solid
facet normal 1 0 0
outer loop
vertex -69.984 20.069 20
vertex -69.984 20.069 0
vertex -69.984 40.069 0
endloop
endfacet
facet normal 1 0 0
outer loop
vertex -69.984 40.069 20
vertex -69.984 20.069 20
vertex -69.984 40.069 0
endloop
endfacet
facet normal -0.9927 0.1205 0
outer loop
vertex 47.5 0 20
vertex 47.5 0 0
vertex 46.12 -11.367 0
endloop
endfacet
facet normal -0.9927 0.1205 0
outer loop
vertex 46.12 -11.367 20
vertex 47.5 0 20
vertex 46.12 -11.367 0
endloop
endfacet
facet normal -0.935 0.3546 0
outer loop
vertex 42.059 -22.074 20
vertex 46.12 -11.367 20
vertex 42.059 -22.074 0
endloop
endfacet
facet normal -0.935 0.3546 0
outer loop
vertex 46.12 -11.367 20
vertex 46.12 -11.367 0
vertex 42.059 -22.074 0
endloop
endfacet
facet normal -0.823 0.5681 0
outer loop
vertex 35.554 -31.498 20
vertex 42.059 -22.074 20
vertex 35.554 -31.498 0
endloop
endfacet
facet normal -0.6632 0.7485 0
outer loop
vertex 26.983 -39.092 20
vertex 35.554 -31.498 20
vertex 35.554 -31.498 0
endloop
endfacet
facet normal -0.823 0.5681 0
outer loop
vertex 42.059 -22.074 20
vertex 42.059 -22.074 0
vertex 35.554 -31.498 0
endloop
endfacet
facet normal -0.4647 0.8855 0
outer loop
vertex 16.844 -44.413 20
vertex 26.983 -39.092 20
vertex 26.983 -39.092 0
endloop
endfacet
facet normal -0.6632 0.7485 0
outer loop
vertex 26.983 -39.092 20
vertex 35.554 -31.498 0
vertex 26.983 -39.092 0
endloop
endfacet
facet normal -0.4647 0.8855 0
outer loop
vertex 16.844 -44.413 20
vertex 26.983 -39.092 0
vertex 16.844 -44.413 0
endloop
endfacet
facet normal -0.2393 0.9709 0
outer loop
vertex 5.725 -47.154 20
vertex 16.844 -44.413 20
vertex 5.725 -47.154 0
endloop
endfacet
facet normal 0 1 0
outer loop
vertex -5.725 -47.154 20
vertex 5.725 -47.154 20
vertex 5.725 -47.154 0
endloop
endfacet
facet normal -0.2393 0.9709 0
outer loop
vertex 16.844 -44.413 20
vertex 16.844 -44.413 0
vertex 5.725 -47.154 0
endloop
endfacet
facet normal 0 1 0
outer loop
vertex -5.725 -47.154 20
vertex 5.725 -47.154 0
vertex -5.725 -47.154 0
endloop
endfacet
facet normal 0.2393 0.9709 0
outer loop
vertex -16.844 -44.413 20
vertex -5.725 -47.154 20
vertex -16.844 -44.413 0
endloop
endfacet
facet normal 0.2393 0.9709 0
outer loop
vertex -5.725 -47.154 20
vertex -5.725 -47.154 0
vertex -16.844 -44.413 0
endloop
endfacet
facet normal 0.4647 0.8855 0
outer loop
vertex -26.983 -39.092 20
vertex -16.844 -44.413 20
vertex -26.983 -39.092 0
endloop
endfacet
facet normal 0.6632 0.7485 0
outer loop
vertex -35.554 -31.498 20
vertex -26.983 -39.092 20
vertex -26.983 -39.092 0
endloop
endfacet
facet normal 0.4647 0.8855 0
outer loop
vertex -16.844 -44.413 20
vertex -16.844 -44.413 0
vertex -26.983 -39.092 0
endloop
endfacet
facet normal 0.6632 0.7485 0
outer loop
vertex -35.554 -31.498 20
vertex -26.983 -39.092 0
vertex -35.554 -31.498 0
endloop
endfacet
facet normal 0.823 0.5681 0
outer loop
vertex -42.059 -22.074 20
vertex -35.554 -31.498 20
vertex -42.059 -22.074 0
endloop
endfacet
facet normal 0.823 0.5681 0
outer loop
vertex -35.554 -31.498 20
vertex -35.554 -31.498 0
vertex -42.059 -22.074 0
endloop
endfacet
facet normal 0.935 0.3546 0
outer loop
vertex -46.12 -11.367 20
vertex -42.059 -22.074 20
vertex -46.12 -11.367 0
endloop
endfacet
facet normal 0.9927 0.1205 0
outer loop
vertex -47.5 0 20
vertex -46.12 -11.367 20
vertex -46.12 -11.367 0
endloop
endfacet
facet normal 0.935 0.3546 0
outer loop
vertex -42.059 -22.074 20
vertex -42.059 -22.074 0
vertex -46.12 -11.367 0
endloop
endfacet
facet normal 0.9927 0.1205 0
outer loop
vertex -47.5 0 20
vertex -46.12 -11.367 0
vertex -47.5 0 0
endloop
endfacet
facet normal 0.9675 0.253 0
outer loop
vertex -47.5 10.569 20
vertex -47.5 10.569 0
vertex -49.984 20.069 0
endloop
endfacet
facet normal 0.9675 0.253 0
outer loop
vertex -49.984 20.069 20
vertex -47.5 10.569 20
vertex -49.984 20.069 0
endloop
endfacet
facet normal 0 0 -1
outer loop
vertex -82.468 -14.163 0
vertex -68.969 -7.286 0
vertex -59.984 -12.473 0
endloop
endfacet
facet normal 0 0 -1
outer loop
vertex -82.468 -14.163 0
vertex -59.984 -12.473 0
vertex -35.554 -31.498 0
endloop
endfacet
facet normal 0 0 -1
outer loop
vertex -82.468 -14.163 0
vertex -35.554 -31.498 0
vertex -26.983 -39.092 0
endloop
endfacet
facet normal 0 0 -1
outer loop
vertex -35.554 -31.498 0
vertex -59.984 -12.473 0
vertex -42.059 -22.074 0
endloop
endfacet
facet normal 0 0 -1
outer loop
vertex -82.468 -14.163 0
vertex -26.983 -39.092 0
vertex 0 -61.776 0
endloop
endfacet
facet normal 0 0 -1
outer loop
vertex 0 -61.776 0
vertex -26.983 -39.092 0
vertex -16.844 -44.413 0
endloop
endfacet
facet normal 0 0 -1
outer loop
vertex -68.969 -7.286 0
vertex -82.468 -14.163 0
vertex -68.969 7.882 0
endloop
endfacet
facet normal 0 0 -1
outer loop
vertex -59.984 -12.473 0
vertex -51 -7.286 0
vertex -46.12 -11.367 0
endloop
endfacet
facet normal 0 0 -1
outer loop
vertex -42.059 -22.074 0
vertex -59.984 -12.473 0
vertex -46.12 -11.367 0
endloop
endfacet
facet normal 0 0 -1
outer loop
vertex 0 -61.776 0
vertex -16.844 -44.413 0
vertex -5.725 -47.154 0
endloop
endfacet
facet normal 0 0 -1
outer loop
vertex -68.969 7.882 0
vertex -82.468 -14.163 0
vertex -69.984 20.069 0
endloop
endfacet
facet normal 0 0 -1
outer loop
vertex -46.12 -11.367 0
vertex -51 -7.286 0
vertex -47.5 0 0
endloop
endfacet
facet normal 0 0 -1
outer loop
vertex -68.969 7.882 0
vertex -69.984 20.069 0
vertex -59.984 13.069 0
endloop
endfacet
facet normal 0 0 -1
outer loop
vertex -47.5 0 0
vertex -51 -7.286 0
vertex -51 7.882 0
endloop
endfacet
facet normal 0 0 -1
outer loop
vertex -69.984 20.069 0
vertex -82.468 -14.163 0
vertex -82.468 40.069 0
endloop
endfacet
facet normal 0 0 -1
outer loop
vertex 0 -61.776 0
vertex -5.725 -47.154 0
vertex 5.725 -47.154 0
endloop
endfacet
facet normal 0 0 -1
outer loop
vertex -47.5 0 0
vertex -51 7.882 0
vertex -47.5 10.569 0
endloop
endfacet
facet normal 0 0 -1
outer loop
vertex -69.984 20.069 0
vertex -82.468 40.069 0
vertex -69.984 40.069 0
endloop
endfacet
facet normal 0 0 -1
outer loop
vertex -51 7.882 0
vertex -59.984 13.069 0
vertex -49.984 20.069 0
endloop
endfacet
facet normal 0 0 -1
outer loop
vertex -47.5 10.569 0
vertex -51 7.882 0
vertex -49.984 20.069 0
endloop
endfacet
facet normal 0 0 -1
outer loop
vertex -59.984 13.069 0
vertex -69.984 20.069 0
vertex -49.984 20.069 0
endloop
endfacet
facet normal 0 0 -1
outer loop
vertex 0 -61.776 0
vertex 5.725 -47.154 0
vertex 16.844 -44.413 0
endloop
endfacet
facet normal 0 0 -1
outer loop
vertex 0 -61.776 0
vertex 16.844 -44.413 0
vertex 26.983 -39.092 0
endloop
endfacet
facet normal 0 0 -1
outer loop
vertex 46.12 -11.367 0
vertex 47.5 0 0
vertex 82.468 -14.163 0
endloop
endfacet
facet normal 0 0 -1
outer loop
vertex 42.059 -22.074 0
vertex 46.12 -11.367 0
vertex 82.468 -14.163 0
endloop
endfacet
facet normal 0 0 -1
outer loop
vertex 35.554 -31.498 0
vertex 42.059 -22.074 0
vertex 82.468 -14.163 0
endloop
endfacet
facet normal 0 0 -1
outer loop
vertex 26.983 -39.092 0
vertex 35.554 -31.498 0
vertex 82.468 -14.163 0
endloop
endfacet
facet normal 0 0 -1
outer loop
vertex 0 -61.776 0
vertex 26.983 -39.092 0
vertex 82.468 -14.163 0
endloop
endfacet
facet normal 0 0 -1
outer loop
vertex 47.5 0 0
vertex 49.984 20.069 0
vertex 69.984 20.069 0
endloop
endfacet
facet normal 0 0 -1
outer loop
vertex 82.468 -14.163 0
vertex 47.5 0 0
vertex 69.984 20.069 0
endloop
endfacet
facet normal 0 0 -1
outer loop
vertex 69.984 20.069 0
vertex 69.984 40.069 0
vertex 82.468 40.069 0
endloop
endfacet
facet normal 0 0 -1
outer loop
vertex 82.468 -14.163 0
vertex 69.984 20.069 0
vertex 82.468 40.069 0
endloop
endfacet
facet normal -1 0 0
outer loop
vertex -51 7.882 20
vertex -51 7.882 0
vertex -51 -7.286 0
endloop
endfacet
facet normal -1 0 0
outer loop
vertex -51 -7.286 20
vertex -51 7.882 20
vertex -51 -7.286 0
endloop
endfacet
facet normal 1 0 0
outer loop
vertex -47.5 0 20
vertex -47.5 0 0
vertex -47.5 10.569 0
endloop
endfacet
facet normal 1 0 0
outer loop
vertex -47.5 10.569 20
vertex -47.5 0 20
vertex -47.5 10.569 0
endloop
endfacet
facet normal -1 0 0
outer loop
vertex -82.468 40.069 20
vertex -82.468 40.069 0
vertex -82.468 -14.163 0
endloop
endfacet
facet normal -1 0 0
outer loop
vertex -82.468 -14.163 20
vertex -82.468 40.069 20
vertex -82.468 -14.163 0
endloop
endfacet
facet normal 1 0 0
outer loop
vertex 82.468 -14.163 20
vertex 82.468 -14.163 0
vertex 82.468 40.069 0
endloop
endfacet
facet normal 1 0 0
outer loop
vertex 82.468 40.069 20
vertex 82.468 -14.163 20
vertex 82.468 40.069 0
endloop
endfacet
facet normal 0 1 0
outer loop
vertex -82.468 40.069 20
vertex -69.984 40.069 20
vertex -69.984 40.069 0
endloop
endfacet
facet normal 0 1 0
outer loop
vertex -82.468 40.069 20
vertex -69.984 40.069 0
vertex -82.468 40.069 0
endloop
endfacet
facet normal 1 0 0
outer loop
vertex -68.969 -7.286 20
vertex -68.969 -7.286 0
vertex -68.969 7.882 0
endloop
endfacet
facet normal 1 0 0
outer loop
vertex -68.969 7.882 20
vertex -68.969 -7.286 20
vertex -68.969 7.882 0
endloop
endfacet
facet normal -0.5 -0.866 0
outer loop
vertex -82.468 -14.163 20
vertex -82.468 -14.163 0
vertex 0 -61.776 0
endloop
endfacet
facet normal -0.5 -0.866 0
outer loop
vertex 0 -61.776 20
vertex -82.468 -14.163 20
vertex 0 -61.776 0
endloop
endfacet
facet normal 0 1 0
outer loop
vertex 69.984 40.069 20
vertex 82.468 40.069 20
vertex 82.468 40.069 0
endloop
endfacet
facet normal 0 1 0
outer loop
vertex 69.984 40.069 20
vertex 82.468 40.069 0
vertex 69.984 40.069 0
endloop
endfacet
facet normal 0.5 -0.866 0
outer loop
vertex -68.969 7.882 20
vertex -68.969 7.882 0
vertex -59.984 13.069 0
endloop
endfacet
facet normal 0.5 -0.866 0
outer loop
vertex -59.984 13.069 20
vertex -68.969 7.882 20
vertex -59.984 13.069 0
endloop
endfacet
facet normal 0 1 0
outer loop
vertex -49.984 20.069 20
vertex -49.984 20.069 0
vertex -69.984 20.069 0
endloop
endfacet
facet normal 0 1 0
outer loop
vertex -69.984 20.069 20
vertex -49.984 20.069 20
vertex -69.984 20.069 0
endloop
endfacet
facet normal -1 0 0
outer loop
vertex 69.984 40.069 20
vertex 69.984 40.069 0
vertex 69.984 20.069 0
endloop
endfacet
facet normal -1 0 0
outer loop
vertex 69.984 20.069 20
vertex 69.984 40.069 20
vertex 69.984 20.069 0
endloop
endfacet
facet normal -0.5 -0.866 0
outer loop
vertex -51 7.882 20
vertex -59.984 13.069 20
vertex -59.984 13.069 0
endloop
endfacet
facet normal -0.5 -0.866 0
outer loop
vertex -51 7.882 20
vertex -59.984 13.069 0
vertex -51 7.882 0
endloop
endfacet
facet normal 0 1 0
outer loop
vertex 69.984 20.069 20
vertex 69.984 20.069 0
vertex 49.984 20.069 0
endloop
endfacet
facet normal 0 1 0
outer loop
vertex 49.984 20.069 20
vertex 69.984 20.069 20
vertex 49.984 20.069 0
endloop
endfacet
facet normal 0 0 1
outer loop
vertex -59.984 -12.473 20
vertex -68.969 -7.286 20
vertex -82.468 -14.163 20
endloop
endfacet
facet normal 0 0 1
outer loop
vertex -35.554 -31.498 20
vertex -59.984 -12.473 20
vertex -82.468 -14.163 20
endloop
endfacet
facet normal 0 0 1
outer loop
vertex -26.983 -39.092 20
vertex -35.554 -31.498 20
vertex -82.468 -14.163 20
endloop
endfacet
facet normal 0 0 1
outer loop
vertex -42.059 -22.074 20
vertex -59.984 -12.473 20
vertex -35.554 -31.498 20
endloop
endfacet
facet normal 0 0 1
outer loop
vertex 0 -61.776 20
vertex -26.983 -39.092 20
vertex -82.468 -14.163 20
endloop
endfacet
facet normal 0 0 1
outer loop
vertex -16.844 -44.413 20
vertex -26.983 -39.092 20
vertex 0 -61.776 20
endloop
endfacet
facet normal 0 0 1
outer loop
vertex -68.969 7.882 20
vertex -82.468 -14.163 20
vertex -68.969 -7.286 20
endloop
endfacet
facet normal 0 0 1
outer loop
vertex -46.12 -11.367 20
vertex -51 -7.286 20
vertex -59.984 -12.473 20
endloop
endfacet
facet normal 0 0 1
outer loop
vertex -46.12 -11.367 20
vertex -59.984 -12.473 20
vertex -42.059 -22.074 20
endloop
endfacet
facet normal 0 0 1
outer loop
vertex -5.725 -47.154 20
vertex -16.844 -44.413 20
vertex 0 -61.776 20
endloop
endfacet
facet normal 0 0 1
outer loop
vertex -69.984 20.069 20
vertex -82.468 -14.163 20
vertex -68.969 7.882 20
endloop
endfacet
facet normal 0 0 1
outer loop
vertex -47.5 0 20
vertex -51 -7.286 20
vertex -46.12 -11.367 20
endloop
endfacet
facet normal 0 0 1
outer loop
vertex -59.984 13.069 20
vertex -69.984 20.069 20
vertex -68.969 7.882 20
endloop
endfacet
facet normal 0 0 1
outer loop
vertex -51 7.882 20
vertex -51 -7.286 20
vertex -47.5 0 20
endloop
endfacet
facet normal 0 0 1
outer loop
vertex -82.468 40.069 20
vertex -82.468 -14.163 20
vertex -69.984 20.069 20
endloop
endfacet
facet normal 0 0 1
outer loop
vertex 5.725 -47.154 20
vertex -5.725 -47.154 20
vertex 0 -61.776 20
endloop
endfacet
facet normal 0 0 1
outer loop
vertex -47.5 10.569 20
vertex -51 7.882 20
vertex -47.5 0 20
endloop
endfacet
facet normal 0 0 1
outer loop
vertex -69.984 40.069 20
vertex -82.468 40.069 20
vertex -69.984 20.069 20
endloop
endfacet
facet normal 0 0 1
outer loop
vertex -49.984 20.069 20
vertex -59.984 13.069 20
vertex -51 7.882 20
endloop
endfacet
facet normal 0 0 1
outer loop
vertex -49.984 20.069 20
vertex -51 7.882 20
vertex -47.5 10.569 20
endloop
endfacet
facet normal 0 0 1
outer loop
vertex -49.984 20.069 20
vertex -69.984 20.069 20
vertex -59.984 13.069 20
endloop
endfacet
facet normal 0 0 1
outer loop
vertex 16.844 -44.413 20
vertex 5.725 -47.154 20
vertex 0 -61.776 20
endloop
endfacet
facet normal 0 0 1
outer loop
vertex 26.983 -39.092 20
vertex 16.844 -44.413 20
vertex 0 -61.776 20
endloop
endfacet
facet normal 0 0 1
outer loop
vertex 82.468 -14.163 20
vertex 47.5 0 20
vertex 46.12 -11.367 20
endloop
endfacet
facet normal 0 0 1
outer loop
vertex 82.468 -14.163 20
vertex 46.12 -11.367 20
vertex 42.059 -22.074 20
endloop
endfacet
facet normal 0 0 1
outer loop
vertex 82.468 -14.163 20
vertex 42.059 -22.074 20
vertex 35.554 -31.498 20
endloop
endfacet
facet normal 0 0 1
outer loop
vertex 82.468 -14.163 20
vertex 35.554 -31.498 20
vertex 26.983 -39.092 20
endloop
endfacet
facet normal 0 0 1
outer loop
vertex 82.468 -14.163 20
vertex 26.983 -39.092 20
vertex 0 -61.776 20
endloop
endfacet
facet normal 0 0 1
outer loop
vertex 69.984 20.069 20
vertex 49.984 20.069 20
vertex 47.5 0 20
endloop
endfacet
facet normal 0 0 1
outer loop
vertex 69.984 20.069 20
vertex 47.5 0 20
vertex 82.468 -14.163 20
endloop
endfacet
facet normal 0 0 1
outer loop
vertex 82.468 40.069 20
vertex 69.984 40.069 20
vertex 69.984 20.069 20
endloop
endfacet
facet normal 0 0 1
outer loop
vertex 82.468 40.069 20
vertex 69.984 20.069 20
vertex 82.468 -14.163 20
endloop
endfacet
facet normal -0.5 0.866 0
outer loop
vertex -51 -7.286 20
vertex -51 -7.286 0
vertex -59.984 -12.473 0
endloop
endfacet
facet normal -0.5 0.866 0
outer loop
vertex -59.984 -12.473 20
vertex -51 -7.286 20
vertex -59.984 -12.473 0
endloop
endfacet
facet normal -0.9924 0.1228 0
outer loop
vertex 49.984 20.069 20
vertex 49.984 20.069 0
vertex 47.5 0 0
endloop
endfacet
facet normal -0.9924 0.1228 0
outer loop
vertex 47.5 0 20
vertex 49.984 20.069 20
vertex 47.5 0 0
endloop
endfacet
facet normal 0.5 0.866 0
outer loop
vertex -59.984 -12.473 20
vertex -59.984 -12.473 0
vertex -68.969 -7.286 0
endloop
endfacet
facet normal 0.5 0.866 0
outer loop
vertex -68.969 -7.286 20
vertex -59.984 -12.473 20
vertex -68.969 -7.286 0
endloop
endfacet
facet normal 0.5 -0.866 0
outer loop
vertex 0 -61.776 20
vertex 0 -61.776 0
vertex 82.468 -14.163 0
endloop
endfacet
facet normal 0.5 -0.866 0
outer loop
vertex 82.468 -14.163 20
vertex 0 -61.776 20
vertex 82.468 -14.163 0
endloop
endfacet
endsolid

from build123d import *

# Parameters (mm, degrees)
AUFSATZ_LINEAR_AUSTRAGEN1_DEPTH = 20


with BuildPart() as part:
    # Skizze1 → Aufsatz-Linear austragen1 (new body)
    with BuildSketch(Plane.XY):
        with BuildLine():
            Line((-49.984452808, 20.068980322), (-69.984452808, 20.068980322))
            Line((-69.984452808, 20.068980322), (-69.984452808, 40.068980322))
            Line((-69.984452808, 40.068980322), (-82.468350795, 40.068980322))
            Line((-82.468350795, 40.068980322), (-82.468350795, -2.937308237))
            Line((-82.468350795, -2.937308237), (-82.468350795, -14.163354272))
            Line((-82.468350795, -14.163354272), (0, -61.776478803))
            Line((0, -61.776478803), (82.468350795, -14.163354272))
            Line((82.468350795, -14.163354272), (82.468350795, -2.937308237))
            Line((82.468350795, -2.937308237), (82.468350795, 40.068980322))
            Line((82.468350795, 40.068980322), (69.984452808, 40.068980322))
            Line((69.984452808, 40.068980322), (69.984452808, 20.068980322))
            Line((69.984452808, 20.068980322), (49.984452808, 20.068980322))
            Line((49.984452808, 20.068980322), (47.5, 0))
            ThreePointArc((47.5, 0), (0, -47.5), (-47.5, 0))
            Line((-47.5, 0), (-47.5, 10.568980322))
            Line((-47.5, 10.568980322), (-49.984452808, 20.068980322))
        make_face()
        Polygon((-59.984452808, 13.068980322), (-51, 7.881804075), (-51, -7.286243364), (-59.984452808, -12.47341961), (-68.968905615, -7.286243364), (-68.968905615, 7.881804075), align=None, mode=Mode.SUBTRACT)
    extrude(amount=AUFSATZ_LINEAR_AUSTRAGEN1_DEPTH)


solid = part.part
